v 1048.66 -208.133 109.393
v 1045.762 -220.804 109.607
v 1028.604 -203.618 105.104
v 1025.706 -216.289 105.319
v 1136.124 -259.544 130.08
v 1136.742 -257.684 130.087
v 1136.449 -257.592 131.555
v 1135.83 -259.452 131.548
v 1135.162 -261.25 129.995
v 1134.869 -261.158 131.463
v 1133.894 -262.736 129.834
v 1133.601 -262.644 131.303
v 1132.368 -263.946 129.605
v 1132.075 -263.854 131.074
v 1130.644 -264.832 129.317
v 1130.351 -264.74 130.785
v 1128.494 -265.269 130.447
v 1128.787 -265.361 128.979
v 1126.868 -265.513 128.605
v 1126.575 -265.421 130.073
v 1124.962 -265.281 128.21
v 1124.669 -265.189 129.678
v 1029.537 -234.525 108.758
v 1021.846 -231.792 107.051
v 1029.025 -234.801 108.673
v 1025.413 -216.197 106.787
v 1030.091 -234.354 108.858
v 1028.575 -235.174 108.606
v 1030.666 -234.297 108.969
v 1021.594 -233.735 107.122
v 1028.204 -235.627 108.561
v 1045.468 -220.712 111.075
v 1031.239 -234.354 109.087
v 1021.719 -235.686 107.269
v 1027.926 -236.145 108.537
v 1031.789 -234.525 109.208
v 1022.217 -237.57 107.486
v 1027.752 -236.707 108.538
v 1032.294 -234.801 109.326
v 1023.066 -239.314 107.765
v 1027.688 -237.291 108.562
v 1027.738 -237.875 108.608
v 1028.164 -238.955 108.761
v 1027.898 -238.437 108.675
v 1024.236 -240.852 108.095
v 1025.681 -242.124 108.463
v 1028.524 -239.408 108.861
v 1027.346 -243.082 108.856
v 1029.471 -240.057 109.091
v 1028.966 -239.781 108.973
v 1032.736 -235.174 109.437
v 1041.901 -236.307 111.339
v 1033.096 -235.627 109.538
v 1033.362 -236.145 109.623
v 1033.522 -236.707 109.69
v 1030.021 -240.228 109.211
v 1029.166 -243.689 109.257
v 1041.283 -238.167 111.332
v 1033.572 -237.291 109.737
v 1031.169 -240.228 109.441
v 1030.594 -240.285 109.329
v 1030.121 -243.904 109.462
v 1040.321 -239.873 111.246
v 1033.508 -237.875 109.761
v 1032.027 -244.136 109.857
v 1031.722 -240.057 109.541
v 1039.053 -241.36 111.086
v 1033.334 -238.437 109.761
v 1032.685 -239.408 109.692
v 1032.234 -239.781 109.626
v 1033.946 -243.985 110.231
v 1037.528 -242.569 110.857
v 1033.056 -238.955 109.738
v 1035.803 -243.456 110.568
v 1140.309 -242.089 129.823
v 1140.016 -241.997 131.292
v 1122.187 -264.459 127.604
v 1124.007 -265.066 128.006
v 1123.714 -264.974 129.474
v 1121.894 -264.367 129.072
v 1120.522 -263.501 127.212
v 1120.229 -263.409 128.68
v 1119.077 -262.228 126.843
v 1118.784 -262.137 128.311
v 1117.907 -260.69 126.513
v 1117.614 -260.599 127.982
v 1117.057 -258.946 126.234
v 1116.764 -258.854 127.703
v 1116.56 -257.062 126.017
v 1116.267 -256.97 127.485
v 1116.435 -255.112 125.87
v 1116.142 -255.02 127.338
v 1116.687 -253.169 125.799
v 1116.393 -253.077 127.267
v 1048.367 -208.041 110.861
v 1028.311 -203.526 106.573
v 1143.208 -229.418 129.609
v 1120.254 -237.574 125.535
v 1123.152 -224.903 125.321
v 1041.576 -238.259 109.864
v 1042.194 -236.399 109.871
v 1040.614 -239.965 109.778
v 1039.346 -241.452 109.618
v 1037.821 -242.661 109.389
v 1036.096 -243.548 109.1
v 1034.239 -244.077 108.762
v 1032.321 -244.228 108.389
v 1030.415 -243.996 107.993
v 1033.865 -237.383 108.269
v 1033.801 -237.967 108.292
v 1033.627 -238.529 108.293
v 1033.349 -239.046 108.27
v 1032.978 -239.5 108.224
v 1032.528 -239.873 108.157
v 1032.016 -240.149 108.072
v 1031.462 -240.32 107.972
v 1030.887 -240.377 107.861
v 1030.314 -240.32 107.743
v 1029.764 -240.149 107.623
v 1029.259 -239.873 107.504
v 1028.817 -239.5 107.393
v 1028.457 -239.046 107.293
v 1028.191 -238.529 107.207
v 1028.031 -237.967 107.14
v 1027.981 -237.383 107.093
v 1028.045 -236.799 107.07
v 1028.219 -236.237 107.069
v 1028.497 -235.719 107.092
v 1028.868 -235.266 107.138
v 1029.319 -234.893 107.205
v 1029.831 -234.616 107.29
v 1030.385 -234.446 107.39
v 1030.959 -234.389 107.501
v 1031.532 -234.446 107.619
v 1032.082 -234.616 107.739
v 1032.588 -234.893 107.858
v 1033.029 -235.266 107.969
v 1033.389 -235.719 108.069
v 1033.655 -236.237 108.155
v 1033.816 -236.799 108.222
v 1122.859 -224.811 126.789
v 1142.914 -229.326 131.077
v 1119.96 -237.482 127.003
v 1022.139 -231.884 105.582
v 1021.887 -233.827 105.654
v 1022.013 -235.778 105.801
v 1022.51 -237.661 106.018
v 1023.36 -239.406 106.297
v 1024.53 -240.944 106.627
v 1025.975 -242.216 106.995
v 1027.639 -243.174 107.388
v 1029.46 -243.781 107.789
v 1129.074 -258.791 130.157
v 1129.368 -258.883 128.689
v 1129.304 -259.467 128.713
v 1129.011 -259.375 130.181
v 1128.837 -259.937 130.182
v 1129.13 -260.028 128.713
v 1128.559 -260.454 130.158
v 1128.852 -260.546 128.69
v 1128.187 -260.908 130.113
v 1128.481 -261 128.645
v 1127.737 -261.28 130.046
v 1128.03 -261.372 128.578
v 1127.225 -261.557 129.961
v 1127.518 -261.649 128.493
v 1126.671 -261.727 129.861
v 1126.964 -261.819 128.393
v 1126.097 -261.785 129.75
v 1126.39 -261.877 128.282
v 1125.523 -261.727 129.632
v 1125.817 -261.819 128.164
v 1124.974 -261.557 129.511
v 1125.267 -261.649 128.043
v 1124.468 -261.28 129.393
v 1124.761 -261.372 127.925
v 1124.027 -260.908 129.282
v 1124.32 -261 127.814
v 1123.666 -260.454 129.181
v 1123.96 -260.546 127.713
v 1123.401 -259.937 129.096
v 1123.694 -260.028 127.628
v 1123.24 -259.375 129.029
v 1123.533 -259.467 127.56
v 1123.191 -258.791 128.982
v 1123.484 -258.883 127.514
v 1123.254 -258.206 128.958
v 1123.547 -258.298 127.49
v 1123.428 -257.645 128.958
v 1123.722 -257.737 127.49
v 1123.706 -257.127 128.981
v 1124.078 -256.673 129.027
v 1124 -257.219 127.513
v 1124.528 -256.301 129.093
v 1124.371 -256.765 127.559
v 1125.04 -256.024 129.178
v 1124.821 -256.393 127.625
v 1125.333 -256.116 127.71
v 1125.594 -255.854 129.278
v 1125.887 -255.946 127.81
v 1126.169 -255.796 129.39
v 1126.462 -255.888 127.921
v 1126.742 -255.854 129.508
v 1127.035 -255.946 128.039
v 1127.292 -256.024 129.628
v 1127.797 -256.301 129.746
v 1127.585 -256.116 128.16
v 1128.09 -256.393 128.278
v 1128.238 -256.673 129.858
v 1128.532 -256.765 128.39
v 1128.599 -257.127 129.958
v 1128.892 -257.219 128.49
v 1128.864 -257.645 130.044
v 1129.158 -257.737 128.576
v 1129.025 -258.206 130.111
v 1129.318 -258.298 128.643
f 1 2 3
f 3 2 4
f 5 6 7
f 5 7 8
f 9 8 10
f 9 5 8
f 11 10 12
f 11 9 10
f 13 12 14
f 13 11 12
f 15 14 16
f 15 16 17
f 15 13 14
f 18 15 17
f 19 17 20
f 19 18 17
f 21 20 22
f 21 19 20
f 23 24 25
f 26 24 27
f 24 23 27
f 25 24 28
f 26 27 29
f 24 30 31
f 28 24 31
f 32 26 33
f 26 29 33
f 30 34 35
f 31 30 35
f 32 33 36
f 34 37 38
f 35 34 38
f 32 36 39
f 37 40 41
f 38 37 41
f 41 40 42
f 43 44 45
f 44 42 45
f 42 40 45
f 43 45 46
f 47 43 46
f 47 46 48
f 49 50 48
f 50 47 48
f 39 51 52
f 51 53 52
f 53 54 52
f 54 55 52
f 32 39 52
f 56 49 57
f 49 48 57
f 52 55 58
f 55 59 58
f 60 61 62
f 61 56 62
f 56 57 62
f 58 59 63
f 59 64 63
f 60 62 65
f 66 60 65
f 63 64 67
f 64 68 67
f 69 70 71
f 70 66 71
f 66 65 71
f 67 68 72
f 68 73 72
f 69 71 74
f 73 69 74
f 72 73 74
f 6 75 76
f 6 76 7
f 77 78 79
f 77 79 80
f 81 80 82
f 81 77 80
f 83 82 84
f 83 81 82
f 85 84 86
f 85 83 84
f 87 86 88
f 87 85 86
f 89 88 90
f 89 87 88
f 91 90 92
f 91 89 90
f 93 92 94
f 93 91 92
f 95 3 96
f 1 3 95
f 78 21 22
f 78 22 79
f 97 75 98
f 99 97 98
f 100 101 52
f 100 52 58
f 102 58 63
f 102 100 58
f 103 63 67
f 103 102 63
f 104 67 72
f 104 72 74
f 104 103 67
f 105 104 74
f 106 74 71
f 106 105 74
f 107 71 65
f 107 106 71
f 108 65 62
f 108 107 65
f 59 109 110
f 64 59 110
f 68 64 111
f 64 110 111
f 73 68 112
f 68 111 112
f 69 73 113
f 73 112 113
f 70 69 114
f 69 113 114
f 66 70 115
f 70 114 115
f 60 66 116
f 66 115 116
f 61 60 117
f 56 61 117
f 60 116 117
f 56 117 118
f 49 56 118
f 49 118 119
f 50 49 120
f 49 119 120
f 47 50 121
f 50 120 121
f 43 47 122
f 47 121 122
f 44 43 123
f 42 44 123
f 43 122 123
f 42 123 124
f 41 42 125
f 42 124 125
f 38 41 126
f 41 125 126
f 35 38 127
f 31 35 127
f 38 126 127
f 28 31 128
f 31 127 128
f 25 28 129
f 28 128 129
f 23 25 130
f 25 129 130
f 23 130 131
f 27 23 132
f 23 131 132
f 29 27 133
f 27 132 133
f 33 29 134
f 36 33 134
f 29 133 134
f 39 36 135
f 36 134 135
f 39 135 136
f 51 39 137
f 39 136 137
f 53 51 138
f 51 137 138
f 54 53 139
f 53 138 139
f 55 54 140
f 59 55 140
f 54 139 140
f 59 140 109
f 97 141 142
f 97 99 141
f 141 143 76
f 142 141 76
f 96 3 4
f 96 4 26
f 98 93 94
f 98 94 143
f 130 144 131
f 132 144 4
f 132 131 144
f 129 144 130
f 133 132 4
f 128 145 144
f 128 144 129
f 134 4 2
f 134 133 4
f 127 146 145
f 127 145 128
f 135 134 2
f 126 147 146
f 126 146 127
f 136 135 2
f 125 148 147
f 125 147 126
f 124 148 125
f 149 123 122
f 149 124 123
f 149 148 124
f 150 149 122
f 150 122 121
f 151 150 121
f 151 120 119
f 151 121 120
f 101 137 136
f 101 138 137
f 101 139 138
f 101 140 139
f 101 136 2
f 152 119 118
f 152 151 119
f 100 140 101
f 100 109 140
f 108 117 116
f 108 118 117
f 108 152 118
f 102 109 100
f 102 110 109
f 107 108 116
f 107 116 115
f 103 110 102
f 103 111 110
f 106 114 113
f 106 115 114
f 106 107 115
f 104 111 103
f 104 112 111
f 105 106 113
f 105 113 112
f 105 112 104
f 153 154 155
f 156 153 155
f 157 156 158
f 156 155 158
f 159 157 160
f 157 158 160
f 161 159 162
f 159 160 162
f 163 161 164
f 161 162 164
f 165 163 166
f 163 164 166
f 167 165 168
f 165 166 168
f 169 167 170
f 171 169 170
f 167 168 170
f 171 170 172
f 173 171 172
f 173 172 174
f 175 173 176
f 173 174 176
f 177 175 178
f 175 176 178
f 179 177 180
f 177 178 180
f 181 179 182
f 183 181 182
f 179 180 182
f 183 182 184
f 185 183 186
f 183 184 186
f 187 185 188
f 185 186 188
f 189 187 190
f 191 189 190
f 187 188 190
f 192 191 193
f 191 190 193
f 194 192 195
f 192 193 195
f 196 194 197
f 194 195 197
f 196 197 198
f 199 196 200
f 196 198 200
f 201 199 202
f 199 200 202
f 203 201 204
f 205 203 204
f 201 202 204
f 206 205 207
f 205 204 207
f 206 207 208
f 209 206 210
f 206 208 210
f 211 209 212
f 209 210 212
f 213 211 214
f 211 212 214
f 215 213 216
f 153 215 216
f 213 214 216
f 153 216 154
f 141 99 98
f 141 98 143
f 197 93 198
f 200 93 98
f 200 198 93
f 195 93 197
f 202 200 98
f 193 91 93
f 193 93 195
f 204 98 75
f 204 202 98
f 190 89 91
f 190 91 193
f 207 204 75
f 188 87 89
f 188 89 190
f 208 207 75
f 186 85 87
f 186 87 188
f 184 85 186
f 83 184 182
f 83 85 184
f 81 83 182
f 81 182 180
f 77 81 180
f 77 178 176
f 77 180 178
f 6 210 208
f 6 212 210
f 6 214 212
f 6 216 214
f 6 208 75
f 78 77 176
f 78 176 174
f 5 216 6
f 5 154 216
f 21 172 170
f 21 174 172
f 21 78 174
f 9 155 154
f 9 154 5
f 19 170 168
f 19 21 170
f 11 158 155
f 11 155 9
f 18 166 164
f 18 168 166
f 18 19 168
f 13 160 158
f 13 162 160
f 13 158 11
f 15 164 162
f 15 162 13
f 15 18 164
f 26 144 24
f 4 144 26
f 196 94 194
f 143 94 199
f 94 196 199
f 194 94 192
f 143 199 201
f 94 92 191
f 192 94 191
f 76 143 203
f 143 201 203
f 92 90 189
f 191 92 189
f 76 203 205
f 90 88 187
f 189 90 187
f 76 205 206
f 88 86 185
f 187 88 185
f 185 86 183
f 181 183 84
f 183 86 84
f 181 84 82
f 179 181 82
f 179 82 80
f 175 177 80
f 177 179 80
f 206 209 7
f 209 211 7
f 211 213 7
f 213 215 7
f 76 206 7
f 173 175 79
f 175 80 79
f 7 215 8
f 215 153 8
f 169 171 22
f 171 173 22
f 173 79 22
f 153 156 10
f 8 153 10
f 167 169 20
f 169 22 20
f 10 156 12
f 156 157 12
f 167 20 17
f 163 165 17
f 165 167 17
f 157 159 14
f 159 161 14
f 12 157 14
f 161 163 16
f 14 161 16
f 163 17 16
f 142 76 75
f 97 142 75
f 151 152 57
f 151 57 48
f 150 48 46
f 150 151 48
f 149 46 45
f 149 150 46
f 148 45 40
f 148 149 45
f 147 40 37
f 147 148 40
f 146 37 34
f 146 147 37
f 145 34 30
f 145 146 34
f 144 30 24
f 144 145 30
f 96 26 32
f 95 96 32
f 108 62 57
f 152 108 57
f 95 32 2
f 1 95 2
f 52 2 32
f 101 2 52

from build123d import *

# Parameters (mm, degrees)
SZKIC_3D4_R                   = 3
DODANIE_WYCI_GNI_CIE2_DEPTH   = 1.5
DODANIE_WYCI_GNI_CIE2_2_DEPTH = 1.5
DODANIE_WYCI_GNI_CIE3_DEPTH   = 13


with BuildPart() as part:
    # Szkic 3D4 → Dodanie-wyciągnięcie2 (new body)
    with BuildSketch(Plane(origin=(1025.706038393, -216.288954709, 105.318664983), x_dir=(0.9171838518362587, -0.34192929079965745, 0.20459262455926217), z_dir=(0.19549461704670756, -0.061265743629640455, -0.9787892333711423))):
        with BuildLine():
            Line((0, 0), (20.815785914, -2.775438122))
            Line((20.815785914, -2.775438122), (22.930405436, 13.084208289))
            ThreePointArc((22.930405436, 13.084208289), (20.961704759, 20.480346566), (14.33976363, 24.318124497))
            Line((14.33976363, 24.318124497), (13.348535729, 24.450288217))
            ThreePointArc((13.348535729, 24.450288217), (5.952397453, 22.48158754), (2.114619521, 15.859646411))
            Line((2.114619521, 15.859646411), (0, 0))
        make_face()
        with Locations(Location((12.480994513, 17.943729095, 0), (0, 0, 339.966298259))):
            Circle(SZKIC_3D4_R, mode=Mode.SUBTRACT)
    extrude(amount=-DODANIE_WYCI_GNI_CIE2_DEPTH)



with BuildPart() as body_2:
    # Szkic 3D4 → Dodanie-wyci_gni_cie2 2 (new body)
    with BuildSketch(Plane(origin=(1025.706038393, -216.288954709, 105.318664983), x_dir=(0.9171838518362587, -0.34192929079965745, 0.20459262455926217), z_dir=(0.19549461704670756, -0.061265743629640455, -0.9787892333711423))):
        with BuildLine():
            Line((98.131562168, -13.084208289), (118.947348082, -15.859646411))
            Line((118.947348082, -15.859646411), (121.061967603, 0))
            ThreePointArc((121.061967603, 0), (119.093266926, 7.396138277), (112.471325797, 11.233916208))
            Line((112.471325797, 11.233916208), (111.480097897, 11.366079928))
            ThreePointArc((111.480097897, 11.366079928), (104.08395962, 9.397379251), (100.246181689, 2.775438122))
            Line((100.246181689, 2.775438122), (98.131562168, -13.084208289))
        make_face()
        with Locations(Location((111.603784581, 4.727357086, 0), (0, 0, 339.966298259))):
            Circle(SZKIC_3D4_R, mode=Mode.SUBTRACT)
    extrude(amount=-DODANIE_WYCI_GNI_CIE2_2_DEPTH)


with BuildPart() as part_1:
    add(part.part)

    add(body_2.part)  # Dodanie-wyciągnięcie3 merges body 2
    # Szkic1 → Dodanie-wyciągnięcie3 (add)
    with BuildSketch(Plane(origin=(3.595584722, 15.719361841, -0.265778296), x_dir=(0.9748305613773303, -0.22291516630614797, 0.003768983345872848), z_dir=(0.22294702645417608, 0.9746912536391572, -0.016479789882437416))):
        Polygon((1145.188635005, -122.97038823), (1165.762021577, -127.181773388), (1166.062834802, -125.712245776), (1145.48944823, -121.500860618), align=None)
        Polygon((1048.199812593, -103.116715341), (1068.773199165, -107.3281005), (1069.074012391, -105.858572887), (1048.500625819, -101.647187729), align=None)
    extrude(amount=DODANIE_WYCI_GNI_CIE3_DEPTH)


solid = part_1.part
